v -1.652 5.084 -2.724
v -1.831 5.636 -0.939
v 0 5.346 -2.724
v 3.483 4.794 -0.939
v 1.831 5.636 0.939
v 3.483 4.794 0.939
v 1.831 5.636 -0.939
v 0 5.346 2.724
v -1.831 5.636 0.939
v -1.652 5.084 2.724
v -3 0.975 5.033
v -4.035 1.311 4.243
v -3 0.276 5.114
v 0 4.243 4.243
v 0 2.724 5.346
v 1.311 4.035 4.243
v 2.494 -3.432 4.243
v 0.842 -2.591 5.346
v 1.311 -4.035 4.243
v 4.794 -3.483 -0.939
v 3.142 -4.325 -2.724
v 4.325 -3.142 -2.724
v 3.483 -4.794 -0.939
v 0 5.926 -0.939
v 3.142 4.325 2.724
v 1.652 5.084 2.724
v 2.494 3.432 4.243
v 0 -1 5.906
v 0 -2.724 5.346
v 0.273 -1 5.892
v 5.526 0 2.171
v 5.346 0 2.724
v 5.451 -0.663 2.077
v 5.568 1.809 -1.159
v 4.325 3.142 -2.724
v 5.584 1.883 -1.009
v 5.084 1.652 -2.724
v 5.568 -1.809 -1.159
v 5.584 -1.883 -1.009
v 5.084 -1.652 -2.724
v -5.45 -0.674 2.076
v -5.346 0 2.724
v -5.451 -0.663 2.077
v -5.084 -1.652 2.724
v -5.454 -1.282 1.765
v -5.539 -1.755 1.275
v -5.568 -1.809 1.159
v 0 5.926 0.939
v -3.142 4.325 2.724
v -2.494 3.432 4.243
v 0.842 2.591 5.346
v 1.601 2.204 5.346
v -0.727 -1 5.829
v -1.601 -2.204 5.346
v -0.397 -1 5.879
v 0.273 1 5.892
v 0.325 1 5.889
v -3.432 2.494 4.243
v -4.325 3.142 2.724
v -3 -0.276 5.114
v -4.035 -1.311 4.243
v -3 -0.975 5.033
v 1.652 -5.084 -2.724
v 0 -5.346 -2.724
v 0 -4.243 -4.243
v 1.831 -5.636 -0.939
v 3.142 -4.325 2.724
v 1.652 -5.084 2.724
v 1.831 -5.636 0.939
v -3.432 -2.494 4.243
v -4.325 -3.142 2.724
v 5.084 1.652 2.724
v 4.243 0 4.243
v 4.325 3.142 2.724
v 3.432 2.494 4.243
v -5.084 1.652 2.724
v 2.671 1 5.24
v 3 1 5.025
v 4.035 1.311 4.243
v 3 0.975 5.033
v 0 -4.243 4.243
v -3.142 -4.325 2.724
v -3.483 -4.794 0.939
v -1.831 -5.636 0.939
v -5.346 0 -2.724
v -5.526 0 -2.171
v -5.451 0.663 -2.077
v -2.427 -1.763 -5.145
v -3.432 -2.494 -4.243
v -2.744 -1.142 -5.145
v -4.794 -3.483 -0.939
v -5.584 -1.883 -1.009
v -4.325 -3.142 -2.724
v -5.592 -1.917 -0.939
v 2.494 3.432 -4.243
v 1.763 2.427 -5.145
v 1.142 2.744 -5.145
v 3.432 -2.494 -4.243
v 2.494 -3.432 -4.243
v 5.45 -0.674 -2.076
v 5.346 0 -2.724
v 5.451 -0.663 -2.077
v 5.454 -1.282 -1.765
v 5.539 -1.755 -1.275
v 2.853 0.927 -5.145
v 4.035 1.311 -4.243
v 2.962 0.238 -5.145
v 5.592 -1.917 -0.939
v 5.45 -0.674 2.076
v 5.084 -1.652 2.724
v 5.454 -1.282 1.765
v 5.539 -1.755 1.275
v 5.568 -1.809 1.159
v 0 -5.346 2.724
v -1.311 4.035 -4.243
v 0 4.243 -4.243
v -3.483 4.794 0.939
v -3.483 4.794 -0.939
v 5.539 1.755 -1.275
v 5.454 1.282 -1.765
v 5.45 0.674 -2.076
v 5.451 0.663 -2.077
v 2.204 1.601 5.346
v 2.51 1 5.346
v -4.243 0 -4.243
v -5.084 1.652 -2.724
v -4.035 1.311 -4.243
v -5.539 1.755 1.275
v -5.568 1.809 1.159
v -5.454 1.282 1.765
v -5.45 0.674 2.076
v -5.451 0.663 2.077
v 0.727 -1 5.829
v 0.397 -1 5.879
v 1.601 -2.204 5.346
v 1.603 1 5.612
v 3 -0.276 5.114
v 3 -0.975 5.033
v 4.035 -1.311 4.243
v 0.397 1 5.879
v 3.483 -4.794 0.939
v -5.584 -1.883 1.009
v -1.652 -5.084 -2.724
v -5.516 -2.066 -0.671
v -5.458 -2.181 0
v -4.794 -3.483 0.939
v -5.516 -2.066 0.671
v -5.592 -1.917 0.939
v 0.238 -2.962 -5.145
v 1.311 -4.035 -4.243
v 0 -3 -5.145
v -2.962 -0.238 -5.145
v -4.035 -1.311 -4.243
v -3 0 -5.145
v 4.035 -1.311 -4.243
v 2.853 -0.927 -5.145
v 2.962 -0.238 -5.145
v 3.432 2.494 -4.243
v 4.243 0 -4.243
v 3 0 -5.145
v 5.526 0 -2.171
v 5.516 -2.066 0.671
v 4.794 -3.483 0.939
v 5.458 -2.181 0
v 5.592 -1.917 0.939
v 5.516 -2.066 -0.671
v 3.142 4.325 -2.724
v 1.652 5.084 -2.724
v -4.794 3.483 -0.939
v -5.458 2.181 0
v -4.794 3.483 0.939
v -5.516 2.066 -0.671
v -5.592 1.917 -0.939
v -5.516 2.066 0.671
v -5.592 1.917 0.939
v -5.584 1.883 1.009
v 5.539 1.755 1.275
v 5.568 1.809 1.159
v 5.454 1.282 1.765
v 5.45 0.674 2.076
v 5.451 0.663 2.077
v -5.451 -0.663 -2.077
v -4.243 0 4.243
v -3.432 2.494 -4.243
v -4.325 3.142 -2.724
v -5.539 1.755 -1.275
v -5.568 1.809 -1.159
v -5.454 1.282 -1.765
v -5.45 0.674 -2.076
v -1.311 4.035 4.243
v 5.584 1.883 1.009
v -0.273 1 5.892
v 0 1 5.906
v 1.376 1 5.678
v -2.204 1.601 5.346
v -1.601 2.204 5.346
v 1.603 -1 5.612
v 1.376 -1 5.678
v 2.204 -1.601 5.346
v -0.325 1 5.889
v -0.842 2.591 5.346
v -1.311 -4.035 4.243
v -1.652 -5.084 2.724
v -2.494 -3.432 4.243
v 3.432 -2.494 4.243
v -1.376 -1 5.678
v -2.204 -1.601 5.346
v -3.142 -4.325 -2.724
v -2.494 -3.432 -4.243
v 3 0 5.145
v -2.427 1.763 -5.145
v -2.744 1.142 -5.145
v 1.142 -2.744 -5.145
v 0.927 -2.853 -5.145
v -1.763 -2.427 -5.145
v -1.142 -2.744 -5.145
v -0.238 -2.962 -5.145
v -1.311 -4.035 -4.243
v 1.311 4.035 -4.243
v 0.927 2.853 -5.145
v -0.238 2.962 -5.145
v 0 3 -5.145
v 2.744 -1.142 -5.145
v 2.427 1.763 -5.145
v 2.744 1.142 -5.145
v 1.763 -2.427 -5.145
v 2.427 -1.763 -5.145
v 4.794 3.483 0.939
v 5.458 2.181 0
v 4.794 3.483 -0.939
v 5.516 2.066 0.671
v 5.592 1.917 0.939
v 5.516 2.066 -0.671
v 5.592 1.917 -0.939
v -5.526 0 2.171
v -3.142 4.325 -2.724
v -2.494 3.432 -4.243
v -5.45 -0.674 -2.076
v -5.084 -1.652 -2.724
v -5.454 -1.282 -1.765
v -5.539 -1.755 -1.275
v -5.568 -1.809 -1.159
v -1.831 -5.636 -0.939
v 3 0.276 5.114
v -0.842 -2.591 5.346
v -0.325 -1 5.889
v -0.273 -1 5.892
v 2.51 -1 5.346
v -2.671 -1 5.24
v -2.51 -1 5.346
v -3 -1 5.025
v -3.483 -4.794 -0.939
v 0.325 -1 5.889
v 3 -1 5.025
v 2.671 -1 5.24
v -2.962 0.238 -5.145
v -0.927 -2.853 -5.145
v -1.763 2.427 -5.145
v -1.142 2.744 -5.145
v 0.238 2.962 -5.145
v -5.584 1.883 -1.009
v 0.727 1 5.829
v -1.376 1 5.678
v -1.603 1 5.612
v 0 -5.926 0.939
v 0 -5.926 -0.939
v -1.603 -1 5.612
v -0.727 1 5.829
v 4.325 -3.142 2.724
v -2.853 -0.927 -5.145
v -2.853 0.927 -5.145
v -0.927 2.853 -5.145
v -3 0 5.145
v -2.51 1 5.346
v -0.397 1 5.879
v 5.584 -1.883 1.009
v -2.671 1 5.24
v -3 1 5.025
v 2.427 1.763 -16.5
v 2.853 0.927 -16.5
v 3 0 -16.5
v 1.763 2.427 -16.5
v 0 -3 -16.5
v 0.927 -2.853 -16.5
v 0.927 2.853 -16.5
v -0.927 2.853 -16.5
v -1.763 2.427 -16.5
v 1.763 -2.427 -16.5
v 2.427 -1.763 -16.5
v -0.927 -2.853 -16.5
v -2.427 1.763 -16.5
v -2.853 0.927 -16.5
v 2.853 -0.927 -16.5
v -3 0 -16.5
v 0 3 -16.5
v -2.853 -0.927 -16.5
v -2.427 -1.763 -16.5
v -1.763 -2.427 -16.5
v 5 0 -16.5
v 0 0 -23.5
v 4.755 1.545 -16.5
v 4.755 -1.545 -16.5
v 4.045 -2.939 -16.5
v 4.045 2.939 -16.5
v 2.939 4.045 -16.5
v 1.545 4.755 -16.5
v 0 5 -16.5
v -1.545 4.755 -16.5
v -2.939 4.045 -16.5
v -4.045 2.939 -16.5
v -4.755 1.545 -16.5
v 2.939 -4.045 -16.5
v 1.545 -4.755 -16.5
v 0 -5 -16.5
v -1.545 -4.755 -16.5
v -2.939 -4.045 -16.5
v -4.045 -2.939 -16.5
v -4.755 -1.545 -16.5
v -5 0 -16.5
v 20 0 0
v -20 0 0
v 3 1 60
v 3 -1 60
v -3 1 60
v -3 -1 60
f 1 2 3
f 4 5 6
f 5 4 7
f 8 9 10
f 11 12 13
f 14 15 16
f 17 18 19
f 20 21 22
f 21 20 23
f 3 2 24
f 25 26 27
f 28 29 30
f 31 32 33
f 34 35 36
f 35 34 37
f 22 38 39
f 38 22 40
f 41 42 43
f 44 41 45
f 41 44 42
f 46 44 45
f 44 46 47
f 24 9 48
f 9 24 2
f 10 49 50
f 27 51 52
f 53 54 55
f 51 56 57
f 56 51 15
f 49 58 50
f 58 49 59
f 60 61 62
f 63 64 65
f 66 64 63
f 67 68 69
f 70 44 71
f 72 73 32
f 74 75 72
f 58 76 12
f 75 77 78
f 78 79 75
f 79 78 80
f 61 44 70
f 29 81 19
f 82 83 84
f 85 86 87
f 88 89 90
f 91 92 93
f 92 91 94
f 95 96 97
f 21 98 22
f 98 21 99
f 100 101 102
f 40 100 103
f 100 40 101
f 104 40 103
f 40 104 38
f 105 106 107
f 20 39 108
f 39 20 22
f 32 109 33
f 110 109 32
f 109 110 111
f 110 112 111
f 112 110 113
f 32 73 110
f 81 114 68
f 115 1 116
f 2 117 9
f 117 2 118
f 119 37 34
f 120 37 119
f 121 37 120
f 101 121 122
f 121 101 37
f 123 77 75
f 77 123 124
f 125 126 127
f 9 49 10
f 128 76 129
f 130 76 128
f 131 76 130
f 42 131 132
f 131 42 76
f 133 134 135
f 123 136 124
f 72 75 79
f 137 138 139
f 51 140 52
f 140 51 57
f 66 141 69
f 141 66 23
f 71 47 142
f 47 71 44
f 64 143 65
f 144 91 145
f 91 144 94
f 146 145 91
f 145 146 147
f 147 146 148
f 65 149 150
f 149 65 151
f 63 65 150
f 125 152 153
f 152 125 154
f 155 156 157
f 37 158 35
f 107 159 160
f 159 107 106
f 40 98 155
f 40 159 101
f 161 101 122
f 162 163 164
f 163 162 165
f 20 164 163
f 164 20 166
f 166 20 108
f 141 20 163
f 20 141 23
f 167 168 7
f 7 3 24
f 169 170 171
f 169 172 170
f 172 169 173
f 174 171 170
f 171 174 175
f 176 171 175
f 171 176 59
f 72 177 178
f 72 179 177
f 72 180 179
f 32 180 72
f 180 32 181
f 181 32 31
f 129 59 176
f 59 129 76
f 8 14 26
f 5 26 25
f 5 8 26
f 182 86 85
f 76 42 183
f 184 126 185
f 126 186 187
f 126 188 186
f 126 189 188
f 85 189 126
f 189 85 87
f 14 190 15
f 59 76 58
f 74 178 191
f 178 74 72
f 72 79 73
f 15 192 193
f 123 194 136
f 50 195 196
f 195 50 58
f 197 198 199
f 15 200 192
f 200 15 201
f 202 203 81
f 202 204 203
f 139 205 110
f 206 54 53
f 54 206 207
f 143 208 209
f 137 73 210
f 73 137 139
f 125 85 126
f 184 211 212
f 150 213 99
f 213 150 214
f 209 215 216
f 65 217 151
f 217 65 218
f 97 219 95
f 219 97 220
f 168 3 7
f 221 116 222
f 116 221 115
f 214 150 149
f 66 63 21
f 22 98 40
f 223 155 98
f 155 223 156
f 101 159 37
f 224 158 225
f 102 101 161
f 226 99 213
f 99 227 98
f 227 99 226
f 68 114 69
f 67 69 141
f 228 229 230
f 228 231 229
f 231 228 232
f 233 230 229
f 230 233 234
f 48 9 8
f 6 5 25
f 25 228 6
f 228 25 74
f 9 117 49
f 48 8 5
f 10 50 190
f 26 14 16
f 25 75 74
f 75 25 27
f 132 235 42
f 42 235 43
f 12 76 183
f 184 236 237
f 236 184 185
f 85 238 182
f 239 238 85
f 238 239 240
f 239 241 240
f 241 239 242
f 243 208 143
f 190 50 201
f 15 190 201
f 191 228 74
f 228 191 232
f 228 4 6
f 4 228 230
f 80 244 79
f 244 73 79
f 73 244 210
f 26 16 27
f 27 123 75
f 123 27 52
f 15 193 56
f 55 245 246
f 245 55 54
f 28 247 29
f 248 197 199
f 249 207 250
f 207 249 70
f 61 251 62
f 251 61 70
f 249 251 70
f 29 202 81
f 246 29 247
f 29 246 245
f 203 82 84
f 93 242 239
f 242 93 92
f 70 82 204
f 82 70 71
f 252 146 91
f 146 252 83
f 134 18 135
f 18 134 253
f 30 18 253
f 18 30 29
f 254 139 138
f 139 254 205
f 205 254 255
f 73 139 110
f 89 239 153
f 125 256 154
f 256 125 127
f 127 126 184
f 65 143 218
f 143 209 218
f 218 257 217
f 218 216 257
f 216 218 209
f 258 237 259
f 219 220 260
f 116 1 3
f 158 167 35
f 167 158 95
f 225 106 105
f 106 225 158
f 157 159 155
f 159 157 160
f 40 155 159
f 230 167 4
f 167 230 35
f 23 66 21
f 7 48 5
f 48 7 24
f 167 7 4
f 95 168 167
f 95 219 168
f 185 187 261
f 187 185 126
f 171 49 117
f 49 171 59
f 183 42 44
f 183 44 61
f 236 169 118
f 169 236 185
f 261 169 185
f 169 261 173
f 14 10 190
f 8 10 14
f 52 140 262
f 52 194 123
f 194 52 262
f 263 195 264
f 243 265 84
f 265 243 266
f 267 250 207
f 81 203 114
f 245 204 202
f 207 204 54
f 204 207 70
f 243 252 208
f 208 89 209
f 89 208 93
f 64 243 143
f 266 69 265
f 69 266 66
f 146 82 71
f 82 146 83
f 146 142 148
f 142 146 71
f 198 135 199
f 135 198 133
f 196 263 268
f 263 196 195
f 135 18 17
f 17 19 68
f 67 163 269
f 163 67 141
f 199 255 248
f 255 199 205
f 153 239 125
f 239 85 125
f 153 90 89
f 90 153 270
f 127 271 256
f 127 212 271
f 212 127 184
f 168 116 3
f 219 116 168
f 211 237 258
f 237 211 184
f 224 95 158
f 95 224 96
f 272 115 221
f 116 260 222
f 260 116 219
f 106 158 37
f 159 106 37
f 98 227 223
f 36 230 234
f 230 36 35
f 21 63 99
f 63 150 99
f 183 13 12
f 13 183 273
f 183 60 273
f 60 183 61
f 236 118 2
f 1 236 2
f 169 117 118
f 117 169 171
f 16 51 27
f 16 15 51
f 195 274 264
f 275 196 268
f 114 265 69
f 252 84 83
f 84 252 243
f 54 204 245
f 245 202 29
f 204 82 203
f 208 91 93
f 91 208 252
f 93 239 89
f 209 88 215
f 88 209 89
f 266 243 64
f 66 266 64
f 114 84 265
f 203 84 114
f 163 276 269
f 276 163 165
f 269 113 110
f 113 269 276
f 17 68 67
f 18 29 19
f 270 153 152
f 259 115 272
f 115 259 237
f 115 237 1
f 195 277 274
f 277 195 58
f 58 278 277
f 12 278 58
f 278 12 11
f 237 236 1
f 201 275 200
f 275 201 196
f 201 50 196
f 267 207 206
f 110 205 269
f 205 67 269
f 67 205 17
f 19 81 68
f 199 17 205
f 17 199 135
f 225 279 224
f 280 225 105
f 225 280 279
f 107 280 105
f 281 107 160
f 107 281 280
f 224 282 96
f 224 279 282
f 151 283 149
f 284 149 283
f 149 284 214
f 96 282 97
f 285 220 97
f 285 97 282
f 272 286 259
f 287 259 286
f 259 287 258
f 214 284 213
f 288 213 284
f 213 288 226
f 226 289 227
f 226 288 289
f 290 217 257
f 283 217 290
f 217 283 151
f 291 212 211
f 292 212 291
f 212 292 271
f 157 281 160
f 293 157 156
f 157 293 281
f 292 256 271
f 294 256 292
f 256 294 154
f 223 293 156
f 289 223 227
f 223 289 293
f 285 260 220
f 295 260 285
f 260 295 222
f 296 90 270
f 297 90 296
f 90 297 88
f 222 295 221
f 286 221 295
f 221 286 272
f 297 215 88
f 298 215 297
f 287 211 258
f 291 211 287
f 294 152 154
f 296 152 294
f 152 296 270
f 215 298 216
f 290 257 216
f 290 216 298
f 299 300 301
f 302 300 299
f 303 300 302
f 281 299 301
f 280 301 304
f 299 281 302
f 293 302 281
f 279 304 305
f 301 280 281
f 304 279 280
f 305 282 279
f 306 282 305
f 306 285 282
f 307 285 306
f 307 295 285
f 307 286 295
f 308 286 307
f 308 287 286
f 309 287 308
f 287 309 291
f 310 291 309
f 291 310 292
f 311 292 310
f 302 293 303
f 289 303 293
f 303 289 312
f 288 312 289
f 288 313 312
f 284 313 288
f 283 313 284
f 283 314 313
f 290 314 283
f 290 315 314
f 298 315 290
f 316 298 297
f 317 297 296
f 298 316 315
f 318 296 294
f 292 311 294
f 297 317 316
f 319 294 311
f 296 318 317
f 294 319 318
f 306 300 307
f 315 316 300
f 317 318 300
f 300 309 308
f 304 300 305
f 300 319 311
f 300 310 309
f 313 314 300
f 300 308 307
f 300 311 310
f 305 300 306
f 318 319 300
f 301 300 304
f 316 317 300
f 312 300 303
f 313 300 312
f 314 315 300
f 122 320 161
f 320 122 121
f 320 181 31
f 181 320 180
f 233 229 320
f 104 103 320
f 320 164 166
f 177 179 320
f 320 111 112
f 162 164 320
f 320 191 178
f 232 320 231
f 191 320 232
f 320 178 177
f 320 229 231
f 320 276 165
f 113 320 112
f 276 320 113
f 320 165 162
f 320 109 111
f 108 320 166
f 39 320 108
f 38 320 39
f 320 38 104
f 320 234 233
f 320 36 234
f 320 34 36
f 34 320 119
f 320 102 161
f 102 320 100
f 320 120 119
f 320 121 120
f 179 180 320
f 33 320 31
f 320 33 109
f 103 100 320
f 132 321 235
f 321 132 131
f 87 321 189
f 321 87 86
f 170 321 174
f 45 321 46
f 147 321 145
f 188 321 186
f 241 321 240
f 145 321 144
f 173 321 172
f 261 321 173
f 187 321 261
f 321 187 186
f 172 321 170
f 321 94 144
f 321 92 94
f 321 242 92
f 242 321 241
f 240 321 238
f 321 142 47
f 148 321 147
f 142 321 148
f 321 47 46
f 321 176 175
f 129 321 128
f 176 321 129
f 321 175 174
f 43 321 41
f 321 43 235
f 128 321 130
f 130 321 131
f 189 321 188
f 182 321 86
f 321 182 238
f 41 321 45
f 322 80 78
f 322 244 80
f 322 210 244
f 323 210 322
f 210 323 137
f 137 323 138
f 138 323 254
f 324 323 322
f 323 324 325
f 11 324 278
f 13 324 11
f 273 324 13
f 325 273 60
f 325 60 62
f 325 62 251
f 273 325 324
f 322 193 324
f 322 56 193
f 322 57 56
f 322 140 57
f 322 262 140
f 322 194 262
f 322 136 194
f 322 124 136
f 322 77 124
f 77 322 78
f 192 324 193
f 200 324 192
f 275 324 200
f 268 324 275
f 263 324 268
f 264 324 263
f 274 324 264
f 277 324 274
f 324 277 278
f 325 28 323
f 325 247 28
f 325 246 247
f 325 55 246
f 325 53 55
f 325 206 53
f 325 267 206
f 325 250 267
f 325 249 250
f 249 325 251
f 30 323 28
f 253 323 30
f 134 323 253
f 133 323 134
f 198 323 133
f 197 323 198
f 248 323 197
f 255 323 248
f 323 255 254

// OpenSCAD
quality = 20;

sphere(6,20,$fn=quality);
translate([0,0,-8]){
    cylinder(h = 20,r1=3,r2=3,center = true, $fn=quality);
}
translate([0,0,-20]){
    cylinder(h = 7,r1=0,r2=5,center = true, $fn=quality);
    
}
rotate([0,90,0]){cylinder(h = 20,r1=3,r2=0,center = false, $fn=quality);
}
rotate([0,270,0]){cylinder(h = 20,r1=3,r2=0,center = false, $fn=quality);
}
translate([0,0,30]){cube([6,2,60],true);
}
